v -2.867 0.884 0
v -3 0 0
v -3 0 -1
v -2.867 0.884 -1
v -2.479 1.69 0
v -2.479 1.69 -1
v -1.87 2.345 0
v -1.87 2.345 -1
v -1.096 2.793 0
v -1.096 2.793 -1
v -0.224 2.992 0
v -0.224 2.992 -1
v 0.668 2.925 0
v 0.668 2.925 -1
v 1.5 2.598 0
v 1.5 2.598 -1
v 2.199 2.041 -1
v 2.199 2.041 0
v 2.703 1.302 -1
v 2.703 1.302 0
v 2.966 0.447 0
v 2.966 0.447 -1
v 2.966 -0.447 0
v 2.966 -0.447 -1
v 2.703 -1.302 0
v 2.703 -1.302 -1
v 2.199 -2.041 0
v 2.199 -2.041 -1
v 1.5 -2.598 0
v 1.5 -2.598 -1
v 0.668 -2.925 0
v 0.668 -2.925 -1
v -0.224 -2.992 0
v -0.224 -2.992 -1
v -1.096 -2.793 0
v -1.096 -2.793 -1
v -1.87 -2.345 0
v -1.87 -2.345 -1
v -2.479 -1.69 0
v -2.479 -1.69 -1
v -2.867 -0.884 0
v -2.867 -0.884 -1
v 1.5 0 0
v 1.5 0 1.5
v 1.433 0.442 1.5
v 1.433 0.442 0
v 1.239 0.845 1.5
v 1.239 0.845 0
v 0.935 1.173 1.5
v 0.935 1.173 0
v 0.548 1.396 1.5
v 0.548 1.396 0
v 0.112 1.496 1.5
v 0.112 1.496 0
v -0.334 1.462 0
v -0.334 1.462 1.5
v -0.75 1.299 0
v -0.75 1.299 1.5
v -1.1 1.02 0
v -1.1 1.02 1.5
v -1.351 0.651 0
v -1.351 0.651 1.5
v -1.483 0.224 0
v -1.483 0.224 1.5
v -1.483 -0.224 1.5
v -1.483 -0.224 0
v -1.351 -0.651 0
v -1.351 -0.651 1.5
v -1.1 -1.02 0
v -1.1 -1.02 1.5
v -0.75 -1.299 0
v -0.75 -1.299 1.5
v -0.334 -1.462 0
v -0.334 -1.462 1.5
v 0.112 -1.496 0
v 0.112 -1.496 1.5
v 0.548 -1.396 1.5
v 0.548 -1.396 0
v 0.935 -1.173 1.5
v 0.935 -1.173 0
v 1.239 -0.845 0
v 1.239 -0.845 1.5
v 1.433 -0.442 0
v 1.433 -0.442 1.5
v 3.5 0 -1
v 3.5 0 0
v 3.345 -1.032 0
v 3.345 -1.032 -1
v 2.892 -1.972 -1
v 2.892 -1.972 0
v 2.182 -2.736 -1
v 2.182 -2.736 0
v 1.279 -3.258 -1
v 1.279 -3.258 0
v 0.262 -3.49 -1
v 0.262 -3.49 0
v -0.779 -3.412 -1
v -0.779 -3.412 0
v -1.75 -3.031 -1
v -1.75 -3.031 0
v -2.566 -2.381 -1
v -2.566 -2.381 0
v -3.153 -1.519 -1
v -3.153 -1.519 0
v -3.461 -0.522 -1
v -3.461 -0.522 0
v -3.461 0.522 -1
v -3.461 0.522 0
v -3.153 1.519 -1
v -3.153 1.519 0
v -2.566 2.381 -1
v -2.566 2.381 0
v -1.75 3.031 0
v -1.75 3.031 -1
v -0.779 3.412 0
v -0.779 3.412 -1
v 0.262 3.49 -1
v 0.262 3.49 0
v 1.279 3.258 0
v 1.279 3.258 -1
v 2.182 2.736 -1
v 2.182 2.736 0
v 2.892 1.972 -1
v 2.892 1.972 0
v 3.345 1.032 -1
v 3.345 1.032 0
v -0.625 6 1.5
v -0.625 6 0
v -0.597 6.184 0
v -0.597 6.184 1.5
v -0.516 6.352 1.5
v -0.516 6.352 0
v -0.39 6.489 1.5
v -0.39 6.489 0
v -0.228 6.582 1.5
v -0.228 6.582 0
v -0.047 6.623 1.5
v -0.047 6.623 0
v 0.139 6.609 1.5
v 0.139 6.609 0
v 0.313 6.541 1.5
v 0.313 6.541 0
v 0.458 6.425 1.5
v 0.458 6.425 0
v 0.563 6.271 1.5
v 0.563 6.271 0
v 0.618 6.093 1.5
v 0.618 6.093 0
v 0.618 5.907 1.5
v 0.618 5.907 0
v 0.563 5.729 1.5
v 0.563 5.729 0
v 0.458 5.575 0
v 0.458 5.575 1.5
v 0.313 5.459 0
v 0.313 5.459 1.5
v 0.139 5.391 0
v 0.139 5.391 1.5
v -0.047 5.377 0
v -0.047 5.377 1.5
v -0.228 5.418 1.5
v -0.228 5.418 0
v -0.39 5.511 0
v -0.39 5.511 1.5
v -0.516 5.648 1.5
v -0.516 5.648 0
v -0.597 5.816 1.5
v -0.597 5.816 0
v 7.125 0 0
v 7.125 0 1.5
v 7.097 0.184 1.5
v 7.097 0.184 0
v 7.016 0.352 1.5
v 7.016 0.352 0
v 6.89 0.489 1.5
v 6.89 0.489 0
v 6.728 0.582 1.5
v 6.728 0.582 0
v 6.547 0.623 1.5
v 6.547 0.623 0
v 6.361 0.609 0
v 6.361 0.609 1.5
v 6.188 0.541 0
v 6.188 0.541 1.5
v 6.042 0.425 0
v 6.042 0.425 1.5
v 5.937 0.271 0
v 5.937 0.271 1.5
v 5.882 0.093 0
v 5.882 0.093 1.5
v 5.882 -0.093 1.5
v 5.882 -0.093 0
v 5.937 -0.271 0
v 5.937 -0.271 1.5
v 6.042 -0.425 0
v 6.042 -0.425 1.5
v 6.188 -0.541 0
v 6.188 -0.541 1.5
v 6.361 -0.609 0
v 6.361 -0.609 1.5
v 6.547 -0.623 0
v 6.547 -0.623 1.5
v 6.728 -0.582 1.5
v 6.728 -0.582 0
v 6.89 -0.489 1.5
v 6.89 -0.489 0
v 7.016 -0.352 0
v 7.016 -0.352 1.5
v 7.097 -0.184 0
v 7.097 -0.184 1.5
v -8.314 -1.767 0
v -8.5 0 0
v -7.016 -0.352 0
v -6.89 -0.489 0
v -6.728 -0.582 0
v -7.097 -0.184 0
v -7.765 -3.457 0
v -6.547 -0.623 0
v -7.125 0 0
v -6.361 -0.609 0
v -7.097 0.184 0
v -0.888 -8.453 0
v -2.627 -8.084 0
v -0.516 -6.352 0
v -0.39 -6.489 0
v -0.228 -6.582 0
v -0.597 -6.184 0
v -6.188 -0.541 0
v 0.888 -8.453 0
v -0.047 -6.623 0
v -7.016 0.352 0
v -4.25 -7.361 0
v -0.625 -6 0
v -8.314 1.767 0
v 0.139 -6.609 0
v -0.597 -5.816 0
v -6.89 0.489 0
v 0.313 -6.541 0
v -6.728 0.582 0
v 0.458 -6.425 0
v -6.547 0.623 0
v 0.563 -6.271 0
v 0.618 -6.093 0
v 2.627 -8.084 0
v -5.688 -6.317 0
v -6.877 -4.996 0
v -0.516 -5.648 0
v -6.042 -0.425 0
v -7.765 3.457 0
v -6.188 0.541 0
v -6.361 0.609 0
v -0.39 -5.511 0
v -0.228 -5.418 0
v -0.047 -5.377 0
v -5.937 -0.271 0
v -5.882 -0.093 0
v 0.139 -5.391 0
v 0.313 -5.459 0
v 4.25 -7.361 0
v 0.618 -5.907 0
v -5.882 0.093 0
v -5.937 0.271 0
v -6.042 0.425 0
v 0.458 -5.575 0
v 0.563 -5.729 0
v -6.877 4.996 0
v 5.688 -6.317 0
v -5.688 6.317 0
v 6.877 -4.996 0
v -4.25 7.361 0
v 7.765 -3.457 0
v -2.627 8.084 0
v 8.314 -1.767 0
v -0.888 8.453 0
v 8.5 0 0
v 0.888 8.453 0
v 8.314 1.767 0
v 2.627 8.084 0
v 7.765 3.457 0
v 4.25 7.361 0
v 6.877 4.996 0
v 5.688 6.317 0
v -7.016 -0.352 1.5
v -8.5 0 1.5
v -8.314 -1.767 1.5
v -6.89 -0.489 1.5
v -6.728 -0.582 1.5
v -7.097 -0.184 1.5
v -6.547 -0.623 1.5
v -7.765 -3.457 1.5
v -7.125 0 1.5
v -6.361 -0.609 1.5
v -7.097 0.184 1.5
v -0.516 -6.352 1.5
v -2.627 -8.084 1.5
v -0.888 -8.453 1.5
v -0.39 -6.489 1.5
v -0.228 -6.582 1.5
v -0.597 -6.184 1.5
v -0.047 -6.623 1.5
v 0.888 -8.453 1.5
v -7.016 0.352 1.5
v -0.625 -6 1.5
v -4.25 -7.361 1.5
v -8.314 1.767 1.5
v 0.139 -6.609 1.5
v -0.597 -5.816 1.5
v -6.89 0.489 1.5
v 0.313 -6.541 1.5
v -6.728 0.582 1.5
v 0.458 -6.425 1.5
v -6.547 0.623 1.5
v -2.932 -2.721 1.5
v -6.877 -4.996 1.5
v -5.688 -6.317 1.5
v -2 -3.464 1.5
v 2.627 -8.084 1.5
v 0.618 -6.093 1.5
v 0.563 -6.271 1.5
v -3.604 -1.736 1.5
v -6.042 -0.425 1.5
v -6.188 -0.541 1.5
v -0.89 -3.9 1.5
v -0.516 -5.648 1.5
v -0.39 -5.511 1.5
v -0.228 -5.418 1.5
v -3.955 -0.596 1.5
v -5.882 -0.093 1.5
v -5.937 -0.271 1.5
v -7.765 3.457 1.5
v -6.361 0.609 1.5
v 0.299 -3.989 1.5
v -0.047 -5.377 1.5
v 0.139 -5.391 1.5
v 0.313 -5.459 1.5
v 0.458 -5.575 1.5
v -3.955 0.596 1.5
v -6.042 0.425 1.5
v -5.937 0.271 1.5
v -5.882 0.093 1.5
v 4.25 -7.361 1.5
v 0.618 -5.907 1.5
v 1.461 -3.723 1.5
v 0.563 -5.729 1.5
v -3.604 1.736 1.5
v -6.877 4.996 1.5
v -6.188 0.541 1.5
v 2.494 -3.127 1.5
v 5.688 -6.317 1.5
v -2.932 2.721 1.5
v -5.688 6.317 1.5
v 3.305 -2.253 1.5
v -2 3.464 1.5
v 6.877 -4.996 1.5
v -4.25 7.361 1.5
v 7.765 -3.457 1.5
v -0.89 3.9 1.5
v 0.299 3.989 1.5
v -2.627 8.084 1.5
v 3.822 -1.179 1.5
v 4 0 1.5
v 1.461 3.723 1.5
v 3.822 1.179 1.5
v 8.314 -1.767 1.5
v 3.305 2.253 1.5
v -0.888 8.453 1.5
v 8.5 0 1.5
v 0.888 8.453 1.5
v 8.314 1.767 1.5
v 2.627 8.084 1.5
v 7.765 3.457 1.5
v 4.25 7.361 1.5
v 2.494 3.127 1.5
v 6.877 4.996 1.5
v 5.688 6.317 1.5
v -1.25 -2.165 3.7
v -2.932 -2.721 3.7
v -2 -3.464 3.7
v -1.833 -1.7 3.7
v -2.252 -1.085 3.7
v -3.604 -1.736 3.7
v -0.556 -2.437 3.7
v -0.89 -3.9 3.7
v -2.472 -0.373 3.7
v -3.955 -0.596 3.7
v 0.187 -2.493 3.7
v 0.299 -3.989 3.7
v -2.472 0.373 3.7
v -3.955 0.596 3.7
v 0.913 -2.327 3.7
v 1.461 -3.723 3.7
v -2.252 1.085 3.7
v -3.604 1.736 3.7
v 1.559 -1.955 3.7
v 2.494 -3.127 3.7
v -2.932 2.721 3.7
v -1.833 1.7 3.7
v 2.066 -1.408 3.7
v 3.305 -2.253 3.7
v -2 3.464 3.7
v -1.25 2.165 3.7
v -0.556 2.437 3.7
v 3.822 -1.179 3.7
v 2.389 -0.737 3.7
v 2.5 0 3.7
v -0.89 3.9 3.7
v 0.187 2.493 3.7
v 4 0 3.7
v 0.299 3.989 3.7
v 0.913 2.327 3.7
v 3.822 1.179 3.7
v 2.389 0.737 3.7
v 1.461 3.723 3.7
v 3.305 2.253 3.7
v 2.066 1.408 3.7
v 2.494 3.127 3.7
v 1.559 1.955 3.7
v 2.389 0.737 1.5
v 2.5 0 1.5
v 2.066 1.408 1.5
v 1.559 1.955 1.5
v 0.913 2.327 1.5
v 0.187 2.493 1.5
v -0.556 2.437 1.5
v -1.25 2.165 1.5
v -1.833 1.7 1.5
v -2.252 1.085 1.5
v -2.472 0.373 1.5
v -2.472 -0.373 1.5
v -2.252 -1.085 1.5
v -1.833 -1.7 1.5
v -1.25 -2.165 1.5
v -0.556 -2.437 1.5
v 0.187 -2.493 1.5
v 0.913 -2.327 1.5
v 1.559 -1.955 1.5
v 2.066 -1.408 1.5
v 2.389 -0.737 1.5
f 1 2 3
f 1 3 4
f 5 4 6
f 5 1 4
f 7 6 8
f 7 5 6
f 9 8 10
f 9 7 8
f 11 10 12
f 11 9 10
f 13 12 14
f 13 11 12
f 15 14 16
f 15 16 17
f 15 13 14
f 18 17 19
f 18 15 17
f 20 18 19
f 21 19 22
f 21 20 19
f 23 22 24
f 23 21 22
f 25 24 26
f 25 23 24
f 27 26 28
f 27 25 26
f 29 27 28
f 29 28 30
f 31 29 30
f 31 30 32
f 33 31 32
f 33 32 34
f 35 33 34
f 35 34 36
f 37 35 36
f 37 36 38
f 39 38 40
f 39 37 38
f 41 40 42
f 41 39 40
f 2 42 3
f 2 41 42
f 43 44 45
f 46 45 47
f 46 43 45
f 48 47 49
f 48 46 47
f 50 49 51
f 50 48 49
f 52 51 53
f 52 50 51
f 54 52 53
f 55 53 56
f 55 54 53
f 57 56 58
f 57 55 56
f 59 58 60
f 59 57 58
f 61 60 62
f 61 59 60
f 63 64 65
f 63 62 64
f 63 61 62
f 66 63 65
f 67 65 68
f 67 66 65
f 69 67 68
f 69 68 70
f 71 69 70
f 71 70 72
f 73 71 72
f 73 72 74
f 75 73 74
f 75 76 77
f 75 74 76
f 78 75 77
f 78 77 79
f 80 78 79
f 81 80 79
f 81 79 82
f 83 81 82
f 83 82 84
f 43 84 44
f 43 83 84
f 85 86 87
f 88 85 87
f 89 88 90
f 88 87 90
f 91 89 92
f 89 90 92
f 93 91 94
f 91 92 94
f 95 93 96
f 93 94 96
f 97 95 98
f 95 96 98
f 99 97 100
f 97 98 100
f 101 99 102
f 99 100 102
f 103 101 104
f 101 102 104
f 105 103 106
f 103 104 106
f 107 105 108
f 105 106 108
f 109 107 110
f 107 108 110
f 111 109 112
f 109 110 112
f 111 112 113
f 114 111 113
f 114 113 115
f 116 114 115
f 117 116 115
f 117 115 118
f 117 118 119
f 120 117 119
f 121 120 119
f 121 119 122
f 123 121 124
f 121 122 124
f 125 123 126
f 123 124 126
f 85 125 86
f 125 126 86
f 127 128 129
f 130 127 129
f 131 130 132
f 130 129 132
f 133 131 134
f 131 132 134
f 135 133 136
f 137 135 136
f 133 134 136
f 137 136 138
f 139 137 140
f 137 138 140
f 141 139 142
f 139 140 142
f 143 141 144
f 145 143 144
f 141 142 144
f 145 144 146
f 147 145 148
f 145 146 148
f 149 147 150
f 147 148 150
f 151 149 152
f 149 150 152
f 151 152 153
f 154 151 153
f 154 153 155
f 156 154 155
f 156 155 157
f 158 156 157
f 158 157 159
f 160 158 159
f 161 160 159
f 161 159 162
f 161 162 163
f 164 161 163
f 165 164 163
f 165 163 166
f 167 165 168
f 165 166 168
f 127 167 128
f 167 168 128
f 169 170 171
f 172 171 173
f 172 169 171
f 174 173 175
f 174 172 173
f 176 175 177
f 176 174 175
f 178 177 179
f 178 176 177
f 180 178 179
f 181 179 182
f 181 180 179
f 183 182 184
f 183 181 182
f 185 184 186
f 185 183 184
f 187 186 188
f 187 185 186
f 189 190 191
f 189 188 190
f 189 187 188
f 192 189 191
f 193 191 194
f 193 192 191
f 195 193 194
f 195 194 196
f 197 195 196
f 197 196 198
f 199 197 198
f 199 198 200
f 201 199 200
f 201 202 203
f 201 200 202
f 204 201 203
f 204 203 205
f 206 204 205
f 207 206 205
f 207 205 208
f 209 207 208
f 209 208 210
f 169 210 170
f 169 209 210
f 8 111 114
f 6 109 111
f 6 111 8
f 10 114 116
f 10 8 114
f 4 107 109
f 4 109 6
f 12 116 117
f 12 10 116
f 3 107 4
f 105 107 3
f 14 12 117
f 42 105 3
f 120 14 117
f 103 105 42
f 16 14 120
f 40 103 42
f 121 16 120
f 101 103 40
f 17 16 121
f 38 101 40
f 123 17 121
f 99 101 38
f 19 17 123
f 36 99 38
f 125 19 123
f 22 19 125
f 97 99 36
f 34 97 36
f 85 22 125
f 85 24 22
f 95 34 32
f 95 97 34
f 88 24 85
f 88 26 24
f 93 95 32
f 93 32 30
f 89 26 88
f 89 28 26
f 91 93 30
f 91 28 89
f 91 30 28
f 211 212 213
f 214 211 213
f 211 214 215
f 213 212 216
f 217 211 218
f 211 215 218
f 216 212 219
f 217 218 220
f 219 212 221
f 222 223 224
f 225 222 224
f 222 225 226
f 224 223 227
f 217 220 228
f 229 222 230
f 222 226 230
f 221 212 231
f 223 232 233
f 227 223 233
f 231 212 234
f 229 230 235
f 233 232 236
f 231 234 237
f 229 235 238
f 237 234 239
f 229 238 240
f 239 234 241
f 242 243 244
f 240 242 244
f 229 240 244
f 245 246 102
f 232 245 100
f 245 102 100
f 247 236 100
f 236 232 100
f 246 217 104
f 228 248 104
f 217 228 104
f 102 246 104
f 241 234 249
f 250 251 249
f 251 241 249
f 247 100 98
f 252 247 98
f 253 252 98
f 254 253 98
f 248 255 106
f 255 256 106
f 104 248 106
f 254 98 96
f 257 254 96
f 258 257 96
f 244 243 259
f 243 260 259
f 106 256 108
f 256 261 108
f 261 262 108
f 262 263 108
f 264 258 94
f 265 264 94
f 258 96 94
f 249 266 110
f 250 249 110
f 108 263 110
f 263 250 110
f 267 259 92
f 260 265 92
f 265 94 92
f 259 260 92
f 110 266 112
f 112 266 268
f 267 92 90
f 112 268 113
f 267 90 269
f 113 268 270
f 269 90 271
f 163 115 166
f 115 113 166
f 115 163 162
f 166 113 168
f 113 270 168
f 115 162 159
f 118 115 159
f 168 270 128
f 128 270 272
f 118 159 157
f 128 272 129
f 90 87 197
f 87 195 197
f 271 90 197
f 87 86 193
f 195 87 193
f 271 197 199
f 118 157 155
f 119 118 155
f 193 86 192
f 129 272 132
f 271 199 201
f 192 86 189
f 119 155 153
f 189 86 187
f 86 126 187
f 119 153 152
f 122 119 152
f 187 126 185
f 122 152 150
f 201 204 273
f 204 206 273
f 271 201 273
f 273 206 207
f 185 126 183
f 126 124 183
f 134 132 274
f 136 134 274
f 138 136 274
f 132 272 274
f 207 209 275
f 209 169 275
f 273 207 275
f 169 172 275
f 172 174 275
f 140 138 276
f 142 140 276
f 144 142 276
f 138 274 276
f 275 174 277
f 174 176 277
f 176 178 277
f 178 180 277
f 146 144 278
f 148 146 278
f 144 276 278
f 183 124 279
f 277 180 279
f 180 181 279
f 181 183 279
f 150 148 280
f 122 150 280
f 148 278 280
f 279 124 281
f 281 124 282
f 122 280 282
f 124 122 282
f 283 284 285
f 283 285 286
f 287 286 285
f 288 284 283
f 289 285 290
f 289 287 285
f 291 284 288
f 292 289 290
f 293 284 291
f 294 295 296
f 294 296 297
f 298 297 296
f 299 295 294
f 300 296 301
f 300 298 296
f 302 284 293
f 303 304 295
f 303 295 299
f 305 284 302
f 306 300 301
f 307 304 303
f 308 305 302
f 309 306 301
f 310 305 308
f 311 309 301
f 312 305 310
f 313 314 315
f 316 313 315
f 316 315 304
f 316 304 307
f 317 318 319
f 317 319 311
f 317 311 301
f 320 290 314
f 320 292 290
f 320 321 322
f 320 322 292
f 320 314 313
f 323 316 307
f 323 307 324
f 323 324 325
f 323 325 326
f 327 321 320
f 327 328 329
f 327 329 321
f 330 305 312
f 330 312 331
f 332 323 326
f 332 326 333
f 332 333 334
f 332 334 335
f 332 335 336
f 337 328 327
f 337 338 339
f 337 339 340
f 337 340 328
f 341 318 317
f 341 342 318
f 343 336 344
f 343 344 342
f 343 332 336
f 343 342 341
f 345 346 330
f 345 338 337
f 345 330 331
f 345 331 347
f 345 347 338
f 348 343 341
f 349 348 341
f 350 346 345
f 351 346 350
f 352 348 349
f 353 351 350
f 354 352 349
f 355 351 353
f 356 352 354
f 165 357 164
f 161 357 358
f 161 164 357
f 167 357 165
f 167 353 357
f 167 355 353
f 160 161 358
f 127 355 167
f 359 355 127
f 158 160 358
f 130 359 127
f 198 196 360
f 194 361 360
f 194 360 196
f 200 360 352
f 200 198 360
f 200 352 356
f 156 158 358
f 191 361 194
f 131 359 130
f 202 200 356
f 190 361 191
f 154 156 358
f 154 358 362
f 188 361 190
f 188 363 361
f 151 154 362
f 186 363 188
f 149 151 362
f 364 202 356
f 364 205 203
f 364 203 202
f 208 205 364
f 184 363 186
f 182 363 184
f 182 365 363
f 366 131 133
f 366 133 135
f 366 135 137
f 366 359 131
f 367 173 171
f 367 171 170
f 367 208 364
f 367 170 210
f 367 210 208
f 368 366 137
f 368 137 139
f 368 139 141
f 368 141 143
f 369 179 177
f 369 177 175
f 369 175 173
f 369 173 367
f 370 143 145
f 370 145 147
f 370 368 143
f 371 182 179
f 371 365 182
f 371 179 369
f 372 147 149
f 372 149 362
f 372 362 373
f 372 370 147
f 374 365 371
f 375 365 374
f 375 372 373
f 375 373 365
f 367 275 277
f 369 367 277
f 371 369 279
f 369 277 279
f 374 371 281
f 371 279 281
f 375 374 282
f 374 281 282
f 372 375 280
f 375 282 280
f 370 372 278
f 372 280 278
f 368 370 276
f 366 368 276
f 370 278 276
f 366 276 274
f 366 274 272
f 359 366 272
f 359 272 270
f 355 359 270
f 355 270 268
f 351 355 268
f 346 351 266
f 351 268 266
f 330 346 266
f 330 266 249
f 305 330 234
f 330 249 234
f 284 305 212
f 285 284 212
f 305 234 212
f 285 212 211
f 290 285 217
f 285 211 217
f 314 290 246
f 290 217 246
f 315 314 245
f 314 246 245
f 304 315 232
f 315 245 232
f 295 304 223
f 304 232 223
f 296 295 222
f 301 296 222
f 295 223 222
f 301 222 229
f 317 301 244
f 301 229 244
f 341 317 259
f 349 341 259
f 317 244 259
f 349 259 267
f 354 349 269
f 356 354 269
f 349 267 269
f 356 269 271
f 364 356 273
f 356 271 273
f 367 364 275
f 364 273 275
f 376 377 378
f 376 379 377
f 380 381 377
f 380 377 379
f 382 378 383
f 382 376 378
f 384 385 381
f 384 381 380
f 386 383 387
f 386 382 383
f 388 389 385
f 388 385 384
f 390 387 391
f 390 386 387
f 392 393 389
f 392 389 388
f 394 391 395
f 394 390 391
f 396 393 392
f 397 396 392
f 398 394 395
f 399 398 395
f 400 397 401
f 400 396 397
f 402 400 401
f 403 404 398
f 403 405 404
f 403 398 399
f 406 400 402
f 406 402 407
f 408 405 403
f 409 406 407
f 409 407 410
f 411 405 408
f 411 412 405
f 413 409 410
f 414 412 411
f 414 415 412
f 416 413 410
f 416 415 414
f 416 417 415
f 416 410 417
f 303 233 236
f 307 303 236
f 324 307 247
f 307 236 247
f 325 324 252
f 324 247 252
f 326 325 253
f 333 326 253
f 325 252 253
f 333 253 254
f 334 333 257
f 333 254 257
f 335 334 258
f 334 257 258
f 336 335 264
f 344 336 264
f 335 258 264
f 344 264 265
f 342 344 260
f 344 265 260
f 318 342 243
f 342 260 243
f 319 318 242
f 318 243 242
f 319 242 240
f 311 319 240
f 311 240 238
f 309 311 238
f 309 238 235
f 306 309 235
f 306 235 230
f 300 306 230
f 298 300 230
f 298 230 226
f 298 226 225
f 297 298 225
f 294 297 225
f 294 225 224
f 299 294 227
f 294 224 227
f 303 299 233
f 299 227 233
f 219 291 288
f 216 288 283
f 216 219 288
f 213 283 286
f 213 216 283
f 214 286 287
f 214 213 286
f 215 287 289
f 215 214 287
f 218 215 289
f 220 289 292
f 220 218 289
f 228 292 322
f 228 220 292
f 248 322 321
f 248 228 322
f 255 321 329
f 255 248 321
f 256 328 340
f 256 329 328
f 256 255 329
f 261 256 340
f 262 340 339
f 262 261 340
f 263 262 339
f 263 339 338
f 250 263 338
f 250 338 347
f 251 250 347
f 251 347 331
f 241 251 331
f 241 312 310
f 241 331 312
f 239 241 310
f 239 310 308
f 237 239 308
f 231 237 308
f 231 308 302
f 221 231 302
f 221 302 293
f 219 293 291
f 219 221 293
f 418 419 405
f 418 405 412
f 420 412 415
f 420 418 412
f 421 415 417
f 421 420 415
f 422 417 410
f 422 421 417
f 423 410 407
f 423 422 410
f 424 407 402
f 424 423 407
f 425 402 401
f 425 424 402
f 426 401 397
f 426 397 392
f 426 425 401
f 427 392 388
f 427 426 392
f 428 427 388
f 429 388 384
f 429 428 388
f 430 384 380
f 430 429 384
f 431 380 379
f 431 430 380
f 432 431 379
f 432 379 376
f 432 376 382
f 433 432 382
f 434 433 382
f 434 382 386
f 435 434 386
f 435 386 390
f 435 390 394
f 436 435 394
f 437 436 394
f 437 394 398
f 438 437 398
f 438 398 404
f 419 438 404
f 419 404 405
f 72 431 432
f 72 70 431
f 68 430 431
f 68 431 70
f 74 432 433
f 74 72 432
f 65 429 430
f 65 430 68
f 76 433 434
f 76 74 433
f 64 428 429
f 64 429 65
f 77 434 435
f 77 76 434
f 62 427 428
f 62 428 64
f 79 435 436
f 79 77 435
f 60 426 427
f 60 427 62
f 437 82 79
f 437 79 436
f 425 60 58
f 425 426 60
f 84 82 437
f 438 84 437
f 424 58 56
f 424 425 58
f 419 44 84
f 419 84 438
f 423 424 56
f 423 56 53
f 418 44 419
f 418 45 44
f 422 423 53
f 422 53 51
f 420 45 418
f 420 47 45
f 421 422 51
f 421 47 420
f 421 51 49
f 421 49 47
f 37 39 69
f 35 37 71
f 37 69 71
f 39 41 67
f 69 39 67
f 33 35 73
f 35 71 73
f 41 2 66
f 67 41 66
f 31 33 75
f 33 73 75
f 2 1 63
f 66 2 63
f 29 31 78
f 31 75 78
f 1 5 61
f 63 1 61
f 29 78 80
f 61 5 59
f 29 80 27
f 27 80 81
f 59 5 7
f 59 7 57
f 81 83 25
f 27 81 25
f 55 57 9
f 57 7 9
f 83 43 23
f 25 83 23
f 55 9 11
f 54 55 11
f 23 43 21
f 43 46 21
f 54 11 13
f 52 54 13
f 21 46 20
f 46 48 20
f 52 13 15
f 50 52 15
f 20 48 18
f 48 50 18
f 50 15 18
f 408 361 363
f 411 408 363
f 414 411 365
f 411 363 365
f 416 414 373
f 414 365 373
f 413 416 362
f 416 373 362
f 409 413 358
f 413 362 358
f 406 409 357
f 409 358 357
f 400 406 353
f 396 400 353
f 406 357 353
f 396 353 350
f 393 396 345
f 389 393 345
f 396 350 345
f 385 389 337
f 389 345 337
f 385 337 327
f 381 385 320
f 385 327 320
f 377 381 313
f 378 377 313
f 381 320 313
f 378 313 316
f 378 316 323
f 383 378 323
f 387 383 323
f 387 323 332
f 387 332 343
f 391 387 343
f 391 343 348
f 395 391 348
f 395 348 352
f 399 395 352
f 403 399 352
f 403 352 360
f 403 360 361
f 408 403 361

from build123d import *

# Parameters (mm, degrees)
SKETCH1_R           = 8.5
BOSS_EXTRUDE1_DEPTH = 1.5
SKETCH2_R           = 4
SKETCH2_R_2         = 2.5
BOSS_EXTRUDE2_DEPTH = 3.7
SKETCH3_R           = 1.5
CUT_EXTRUDE1_DEPTH  = 2
SKETCH4_R           = 0.625
CUT_EXTRUDE2_DEPTH  = 2
CIRPATTERN1_COUNT   = 2
SKETCH5_R           = 0.625
CUT_EXTRUDE3_DEPTH  = 1.5
SKETCH6_R           = 3.5
SKETCH6_R_2         = 3
BOSS_EXTRUDE3_DEPTH = 1


with BuildPart() as part:
    # Sketch1 → Boss-Extrude1 (new body)
    with BuildSketch(Plane.XY):
        Circle(SKETCH1_R)
    extrude(amount=BOSS_EXTRUDE1_DEPTH)

    # Sketch2 → Boss-Extrude2 (add)
    with BuildSketch(Plane.XY):
        Circle(SKETCH2_R)
        Circle(SKETCH2_R_2, mode=Mode.SUBTRACT)
    extrude(amount=BOSS_EXTRUDE2_DEPTH)

    # Sketch3 → Cut-Extrude1 (cut)
    with BuildSketch(Plane.XY):
        Circle(SKETCH3_R)
    extrude(amount=CUT_EXTRUDE1_DEPTH, mode=Mode.SUBTRACT)

    # Sketch4 → Cut-Extrude2 (cut)
    with BuildSketch(Plane.XY):
        with Locations((6.5, 0)):
            Circle(SKETCH4_R)
    cut_extrude2 = extrude(amount=CUT_EXTRUDE2_DEPTH, mode=Mode.SUBTRACT)

    # CirPattern1: Cut-Extrude2 ×2 about axis
    cirpattern1_axis = Axis((0, 0, 0), (0, 0, 1))
    for i in range(1, CIRPATTERN1_COUNT):
        add(cut_extrude2.rotate(cirpattern1_axis, i * 360 / CIRPATTERN1_COUNT), mode=Mode.SUBTRACT)

    # Sketch5 → Cut-Extrude3 (cut)
    with BuildSketch(Plane(origin=(0, 0, 0), x_dir=(-1, 0, 0), z_dir=(0, 0, -1))):
        with Locations((0, 6)):
            Circle(SKETCH5_R)
        with Locations((0, -6)):
            Circle(SKETCH5_R)
    extrude(amount=-CUT_EXTRUDE3_DEPTH, mode=Mode.SUBTRACT)

    # Sketch6 → Boss-Extrude3 (add)
    with BuildSketch(Plane(origin=(0, 0, 0), x_dir=(-1, 0, 0), z_dir=(0, 0, -1))):
        with Locations(Location((0, 0, 0), (0, 0, 180))):
            Circle(SKETCH6_R)
        Circle(SKETCH6_R_2, mode=Mode.SUBTRACT)
    extrude(amount=BOSS_EXTRUDE3_DEPTH)


solid = part.part
